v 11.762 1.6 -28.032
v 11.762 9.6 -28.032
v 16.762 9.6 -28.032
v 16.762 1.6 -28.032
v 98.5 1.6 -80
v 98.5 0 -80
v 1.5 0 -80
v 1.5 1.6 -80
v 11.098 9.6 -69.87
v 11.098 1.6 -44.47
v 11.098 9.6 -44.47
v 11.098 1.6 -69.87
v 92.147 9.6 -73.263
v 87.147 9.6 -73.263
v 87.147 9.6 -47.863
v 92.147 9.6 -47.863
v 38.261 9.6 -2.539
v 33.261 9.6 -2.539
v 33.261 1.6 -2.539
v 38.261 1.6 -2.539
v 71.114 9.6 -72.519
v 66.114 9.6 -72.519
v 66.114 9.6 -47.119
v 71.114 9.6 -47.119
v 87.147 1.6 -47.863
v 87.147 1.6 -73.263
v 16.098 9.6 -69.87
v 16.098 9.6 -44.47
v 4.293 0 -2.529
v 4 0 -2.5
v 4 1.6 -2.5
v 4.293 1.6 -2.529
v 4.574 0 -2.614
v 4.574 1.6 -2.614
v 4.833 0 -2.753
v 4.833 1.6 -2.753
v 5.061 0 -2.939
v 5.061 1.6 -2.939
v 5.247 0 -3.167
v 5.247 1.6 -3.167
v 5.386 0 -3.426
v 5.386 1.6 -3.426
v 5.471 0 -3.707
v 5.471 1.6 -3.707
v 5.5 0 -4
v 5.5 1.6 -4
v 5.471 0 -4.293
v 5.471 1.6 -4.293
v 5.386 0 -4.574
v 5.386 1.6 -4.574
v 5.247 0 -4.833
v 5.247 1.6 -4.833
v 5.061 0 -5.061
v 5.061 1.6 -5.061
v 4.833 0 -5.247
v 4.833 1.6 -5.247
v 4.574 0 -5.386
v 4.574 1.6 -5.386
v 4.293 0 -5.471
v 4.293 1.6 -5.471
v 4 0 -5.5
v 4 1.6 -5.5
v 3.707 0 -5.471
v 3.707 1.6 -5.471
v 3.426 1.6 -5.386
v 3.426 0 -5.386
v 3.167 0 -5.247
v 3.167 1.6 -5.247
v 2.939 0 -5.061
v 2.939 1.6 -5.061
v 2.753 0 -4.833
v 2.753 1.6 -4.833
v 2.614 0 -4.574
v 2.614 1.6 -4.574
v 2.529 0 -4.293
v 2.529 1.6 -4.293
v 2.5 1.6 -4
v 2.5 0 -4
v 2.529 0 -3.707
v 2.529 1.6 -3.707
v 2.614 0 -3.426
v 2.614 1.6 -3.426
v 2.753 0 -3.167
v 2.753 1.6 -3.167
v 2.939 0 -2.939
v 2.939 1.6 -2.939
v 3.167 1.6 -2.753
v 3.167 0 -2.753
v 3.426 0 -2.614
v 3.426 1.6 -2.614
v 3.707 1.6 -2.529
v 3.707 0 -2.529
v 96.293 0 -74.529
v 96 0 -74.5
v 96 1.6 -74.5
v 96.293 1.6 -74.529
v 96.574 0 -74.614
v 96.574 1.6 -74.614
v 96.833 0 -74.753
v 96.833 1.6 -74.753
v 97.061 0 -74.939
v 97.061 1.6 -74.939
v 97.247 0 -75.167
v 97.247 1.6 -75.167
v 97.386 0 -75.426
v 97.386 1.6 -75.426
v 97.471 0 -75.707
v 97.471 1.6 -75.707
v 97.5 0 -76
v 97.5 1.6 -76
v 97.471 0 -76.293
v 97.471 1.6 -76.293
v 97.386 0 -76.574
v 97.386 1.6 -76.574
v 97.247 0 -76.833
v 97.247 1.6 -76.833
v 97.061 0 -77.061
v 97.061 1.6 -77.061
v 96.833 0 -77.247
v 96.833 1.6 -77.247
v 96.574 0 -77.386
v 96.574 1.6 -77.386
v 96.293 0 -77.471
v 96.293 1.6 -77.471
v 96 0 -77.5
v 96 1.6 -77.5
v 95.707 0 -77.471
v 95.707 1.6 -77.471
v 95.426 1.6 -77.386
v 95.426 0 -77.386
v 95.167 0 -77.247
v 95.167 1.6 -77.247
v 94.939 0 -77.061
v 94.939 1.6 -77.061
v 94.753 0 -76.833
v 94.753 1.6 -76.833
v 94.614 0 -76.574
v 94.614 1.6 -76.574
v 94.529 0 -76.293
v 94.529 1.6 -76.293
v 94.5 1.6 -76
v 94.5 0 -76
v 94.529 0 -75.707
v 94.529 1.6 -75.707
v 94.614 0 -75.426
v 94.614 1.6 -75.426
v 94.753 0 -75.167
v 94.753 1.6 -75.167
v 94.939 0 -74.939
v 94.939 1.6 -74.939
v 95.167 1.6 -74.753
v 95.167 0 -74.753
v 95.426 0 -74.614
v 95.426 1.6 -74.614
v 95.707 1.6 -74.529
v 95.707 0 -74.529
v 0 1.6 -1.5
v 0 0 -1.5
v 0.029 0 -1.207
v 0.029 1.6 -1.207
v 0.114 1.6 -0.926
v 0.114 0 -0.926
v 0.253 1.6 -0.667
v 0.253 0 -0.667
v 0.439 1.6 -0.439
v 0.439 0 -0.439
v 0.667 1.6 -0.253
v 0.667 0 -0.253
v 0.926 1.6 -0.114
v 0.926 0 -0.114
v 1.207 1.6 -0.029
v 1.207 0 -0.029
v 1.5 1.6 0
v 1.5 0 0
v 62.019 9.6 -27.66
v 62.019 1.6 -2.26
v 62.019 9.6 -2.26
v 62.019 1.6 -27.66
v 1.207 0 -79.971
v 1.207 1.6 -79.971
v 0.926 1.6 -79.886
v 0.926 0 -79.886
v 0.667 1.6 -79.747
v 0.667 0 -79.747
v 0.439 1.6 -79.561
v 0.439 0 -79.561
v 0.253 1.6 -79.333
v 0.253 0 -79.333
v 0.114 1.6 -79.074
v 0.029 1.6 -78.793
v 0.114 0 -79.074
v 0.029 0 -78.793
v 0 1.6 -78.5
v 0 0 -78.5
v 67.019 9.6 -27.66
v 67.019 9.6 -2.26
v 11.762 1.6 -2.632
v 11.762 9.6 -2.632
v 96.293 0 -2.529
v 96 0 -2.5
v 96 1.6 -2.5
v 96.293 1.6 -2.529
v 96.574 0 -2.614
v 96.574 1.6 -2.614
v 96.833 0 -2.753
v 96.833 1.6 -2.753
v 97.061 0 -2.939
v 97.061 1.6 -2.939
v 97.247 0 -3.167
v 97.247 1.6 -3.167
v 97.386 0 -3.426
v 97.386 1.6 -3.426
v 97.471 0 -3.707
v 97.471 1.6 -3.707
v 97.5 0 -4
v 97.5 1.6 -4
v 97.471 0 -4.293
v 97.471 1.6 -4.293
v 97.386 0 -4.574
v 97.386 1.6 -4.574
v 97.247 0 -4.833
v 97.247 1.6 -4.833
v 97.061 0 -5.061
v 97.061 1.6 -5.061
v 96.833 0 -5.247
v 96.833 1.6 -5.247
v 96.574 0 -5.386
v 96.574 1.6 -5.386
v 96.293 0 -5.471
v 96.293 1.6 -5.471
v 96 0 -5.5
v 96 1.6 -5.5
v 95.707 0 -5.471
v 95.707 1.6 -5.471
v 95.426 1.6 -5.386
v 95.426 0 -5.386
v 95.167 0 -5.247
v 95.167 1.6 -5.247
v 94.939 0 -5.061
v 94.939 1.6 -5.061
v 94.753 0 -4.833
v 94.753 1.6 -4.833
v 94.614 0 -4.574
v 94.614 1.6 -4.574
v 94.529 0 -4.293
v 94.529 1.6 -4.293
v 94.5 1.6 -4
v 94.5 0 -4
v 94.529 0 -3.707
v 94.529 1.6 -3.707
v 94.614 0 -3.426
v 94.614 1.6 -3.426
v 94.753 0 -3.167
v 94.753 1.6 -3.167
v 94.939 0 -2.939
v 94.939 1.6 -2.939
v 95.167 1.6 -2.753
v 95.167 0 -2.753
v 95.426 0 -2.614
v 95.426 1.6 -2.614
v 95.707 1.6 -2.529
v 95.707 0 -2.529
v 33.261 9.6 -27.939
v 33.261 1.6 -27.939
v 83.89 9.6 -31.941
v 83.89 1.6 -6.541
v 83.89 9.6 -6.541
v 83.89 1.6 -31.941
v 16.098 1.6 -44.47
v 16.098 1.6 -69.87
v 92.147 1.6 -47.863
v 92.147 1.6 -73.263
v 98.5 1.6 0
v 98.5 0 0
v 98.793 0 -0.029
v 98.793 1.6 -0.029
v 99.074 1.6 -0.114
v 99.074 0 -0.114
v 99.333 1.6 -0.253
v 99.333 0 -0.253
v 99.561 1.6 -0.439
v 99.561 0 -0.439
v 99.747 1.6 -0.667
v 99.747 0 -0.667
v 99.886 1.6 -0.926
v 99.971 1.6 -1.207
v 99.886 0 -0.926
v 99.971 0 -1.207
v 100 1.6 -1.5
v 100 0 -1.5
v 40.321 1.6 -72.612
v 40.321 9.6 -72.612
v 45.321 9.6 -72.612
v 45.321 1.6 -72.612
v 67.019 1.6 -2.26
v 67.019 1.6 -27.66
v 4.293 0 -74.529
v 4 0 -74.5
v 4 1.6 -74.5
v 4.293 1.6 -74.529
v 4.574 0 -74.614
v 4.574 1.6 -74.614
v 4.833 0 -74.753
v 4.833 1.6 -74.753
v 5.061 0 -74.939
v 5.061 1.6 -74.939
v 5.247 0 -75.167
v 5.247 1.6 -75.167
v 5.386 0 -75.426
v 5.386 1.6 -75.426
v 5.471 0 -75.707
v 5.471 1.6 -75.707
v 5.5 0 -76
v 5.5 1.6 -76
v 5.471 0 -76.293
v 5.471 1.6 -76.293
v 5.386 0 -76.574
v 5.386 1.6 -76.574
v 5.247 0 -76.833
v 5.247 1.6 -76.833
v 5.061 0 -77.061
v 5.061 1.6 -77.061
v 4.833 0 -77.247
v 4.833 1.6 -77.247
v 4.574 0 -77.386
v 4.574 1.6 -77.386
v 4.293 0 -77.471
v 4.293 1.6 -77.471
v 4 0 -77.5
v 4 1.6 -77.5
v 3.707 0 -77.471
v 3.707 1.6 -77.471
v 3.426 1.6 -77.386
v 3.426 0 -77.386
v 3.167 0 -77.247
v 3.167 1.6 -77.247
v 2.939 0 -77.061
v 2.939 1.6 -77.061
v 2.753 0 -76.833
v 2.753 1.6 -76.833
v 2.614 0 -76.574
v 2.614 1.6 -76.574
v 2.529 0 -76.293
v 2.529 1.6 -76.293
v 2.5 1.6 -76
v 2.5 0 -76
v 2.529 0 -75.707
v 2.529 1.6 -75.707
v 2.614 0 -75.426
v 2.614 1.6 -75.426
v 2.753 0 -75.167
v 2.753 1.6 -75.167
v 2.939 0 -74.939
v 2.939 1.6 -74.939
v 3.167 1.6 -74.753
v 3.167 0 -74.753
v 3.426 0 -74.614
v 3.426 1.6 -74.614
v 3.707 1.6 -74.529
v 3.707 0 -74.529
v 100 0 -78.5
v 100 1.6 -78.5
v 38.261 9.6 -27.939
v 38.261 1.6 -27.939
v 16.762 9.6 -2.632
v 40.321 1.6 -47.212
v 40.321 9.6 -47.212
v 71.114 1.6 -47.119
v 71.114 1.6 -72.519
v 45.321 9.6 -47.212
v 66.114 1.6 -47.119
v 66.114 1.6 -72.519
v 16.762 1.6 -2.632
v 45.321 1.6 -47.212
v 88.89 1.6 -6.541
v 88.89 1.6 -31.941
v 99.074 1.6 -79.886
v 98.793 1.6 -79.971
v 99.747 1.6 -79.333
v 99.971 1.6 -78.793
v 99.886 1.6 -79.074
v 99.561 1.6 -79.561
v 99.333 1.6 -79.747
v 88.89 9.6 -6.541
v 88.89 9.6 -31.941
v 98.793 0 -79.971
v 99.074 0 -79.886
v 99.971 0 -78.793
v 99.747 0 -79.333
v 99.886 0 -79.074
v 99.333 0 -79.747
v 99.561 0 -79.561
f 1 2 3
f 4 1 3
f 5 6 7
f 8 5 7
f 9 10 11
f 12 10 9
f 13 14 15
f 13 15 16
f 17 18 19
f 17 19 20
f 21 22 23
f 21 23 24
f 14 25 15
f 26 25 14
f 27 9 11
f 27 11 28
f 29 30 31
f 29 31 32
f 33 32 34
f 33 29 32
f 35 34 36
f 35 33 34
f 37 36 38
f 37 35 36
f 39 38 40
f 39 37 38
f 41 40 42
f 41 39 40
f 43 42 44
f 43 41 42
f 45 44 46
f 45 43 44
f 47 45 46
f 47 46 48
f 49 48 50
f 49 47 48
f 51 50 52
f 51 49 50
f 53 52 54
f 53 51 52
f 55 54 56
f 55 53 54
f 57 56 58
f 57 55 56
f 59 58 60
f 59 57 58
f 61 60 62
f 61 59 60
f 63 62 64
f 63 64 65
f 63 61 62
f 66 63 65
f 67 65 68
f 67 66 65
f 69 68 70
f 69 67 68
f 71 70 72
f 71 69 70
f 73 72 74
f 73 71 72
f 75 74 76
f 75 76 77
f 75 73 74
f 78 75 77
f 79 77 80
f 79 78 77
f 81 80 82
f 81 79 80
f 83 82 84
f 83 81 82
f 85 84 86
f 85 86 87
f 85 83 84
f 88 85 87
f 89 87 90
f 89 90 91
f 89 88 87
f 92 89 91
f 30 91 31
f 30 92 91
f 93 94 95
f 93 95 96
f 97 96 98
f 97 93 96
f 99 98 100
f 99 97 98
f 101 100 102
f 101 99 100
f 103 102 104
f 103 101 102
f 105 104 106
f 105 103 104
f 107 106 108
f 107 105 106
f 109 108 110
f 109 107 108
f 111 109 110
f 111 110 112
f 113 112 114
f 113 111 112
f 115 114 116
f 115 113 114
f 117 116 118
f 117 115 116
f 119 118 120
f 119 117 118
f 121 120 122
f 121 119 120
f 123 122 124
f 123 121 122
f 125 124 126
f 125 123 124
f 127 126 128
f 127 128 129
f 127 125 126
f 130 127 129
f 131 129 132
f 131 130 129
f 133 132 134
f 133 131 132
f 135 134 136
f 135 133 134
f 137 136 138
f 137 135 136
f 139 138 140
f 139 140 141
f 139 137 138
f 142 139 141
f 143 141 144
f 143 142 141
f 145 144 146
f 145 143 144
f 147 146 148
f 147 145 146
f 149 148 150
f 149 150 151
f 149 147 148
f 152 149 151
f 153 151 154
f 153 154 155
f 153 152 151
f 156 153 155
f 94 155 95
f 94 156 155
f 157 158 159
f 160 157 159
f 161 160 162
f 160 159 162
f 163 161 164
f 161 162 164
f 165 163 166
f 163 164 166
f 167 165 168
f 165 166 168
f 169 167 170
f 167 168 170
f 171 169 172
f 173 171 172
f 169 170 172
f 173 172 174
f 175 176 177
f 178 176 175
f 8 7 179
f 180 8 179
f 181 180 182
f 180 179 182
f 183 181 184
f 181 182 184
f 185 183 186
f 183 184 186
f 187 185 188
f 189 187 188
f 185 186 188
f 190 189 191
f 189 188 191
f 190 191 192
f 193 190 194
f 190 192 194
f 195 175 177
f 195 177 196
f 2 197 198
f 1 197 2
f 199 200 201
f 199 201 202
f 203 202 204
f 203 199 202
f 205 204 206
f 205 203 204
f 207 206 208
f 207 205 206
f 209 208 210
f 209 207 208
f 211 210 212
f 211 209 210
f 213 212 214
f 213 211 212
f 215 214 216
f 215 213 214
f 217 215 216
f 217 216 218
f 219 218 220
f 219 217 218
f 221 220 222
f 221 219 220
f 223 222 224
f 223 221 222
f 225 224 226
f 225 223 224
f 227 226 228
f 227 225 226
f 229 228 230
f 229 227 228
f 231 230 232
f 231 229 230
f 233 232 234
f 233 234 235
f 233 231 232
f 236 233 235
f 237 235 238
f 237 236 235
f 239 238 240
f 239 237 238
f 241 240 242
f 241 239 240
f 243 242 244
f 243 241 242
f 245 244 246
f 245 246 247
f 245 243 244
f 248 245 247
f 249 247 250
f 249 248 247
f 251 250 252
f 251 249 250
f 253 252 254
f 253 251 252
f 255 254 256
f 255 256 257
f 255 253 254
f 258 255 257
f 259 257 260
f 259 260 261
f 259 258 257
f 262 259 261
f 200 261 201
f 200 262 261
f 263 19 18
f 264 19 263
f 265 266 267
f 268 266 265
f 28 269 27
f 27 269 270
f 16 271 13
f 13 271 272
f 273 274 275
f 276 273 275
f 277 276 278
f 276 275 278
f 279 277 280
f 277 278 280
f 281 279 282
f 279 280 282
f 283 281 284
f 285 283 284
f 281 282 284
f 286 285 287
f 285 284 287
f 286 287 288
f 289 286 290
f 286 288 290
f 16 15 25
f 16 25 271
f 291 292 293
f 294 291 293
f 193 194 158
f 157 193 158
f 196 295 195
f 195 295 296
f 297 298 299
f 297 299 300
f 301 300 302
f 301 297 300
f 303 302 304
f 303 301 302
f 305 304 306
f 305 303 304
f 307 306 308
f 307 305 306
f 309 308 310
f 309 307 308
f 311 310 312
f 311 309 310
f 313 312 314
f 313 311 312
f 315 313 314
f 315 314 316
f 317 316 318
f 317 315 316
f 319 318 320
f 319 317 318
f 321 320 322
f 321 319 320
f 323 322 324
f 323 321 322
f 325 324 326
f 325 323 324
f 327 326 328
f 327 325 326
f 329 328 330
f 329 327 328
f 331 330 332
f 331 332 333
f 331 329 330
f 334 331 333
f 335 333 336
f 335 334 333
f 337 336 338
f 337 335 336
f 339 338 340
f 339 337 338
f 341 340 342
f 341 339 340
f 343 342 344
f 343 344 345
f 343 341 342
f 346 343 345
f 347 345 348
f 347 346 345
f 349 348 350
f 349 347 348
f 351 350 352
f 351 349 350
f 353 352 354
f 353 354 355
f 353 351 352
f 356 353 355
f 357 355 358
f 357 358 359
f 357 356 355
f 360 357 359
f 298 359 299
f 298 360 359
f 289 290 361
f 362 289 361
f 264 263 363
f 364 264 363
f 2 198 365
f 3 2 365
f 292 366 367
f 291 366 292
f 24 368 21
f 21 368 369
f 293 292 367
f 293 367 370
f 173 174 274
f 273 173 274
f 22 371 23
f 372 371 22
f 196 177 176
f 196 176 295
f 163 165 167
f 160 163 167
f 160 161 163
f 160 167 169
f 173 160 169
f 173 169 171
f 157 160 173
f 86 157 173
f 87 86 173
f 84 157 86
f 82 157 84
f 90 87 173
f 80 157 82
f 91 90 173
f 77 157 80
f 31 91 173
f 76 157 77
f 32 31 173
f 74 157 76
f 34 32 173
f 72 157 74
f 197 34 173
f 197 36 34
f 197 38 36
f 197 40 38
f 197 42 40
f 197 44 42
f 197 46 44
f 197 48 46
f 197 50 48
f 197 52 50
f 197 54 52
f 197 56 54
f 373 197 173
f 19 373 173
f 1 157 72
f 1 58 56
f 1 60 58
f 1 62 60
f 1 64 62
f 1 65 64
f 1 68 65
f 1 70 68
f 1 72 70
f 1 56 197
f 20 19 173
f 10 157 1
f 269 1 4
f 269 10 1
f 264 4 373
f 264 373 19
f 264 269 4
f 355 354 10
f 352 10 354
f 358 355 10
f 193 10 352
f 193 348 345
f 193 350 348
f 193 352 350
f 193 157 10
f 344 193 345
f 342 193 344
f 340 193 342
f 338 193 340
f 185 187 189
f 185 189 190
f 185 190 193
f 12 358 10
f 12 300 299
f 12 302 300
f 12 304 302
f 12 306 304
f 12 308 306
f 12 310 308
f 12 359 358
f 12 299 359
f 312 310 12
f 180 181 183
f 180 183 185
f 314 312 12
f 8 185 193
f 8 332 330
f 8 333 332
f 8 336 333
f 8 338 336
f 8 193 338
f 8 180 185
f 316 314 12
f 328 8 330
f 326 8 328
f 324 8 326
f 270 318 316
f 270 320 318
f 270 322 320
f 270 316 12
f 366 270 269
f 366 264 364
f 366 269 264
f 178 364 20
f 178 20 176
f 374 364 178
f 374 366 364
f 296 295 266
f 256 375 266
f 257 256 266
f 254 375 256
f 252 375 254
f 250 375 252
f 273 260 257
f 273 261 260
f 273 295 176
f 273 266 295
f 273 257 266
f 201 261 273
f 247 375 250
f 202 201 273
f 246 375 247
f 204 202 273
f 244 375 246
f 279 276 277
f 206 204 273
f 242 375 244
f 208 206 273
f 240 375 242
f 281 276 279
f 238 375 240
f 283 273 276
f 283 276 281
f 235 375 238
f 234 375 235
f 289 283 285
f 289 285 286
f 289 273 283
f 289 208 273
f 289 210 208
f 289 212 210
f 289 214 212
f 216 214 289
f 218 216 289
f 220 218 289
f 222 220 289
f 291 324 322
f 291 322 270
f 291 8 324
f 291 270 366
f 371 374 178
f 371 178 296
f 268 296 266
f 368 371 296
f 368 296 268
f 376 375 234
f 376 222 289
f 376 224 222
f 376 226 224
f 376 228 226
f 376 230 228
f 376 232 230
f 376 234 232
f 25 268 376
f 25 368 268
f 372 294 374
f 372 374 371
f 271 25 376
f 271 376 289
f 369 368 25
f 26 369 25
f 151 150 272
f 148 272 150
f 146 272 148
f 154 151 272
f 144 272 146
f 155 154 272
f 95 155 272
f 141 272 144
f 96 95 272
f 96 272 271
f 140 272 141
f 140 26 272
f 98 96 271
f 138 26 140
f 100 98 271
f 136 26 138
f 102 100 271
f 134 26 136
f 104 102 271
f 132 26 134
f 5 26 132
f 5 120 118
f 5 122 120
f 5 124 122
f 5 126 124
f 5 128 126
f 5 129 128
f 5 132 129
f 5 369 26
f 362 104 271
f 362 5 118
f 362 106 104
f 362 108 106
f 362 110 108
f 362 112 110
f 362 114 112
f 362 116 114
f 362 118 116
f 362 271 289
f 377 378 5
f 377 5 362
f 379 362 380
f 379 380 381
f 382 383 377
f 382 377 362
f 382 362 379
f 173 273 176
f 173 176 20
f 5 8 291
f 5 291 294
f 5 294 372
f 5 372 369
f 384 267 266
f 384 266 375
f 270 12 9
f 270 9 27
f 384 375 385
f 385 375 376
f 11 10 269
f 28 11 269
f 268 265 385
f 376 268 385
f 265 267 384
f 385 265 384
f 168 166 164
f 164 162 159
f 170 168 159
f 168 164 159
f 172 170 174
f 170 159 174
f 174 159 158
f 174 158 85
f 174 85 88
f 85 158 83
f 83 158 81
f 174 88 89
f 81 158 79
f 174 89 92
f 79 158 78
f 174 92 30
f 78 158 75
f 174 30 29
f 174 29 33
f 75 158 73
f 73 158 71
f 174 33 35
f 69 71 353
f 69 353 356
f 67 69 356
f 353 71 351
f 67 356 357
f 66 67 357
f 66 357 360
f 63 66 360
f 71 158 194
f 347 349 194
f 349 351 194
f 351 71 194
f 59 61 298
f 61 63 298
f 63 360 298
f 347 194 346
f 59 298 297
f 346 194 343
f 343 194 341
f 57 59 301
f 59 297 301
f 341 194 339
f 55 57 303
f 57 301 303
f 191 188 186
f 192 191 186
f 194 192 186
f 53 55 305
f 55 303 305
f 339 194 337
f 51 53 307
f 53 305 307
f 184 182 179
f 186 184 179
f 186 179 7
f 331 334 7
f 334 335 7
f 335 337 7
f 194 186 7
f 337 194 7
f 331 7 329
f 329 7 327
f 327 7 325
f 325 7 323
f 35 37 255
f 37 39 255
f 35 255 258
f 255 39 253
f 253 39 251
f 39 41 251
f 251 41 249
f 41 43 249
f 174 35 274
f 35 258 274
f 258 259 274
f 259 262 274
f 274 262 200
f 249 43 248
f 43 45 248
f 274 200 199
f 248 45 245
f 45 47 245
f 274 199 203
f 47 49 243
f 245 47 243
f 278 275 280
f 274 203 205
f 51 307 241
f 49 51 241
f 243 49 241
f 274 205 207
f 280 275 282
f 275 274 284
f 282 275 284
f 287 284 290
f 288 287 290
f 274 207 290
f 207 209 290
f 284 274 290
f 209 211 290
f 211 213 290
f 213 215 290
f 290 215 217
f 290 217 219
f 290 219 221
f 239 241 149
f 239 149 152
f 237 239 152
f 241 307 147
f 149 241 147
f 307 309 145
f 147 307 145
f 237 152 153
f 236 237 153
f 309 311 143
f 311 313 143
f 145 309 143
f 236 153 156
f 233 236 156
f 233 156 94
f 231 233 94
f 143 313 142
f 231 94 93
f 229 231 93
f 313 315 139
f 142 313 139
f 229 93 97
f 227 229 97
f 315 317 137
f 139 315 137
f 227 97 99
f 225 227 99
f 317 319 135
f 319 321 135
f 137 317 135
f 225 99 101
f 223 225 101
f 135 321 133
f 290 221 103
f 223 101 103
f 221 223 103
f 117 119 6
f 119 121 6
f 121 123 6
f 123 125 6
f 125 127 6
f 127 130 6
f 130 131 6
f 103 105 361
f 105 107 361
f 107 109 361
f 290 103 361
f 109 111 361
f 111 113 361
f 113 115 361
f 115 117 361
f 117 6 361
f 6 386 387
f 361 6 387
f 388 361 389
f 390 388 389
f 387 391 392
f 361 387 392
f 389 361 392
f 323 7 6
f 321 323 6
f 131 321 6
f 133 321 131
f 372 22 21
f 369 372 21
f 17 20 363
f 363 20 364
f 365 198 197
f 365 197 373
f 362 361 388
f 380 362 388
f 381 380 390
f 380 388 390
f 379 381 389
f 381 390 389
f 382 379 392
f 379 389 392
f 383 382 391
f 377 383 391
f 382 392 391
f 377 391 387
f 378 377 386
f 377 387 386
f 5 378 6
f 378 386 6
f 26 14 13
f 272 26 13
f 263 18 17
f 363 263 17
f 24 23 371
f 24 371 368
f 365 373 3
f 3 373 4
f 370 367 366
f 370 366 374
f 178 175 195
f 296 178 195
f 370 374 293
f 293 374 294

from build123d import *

# Parameters (mm, degrees)
SKETCH1_R           = 1.5
BOSS_EXTRUDE1_DEPTH = 1.6
SKETCH2_W           = 5
SKETCH2_H           = 25.4
BOSS_EXTRUDE2_DEPTH = 8


with BuildPart() as part:
    # Sketch1 → Boss-Extrude1 (new body)
    with BuildSketch(Plane(origin=(0, 0, 0), x_dir=(1, 0, 0), z_dir=(0, 1, 0))):
        with BuildLine():
            Line((1.5, 0), (98.5, 0))
            ThreePointArc((98.5, 0), (99.560660172, 0.439339828), (100, 1.5))
            Line((100, 1.5), (100, 78.5))
            ThreePointArc((100, 78.5), (99.560660172, 79.560660172), (98.5, 80))
            Line((98.5, 80), (1.5, 80))
            ThreePointArc((1.5, 80), (0.439339828, 79.560660172), (0, 78.5))
            Line((0, 78.5), (0, 1.5))
            ThreePointArc((0, 1.5), (0.439339828, 0.439339828), (1.5, 0))
        make_face()
        with Locations(Location((4, 4, 0), (0, 0, 270))):
            Circle(SKETCH1_R, mode=Mode.SUBTRACT)
        with Locations(Location((96, 76, 0), (0, 0, 270))):
            Circle(SKETCH1_R, mode=Mode.SUBTRACT)
        with Locations(Location((96, 4, 0), (0, 0, 270))):
            Circle(SKETCH1_R, mode=Mode.SUBTRACT)
        with Locations(Location((4, 76, 0), (0, 0, 270))):
            Circle(SKETCH1_R, mode=Mode.SUBTRACT)
    extrude(amount=BOSS_EXTRUDE1_DEPTH)

    # Sketch2 → Boss-Extrude2 (add)
    with BuildSketch(Plane(origin=(0, 1.6, 0), x_dir=(1, 0, 0), z_dir=(0, 1, 0))):
        with Locations((14.261833114, 15.332116758)):
            Rectangle(SKETCH2_W, SKETCH2_H)
        with Locations((13.597516255, 57.170048516)):
            Rectangle(SKETCH2_W, SKETCH2_H)
        with Locations((89.647028889, 60.563234223)):
            Rectangle(SKETCH2_W, SKETCH2_H)
        with Locations((86.389643886, 19.240978761)):
            Rectangle(SKETCH2_W, SKETCH2_H)
        with Locations((42.820913135, 59.911757222)):
            Rectangle(SKETCH2_W, SKETCH2_H)
        with Locations((68.613628586, 59.818689079)):
            Rectangle(SKETCH2_W, SKETCH2_H)
        with Locations((35.760574132, 15.239048615)):
            Rectangle(SKETCH2_W, SKETCH2_H)
        with Locations((64.518630297, 14.959844186)):
            Rectangle(SKETCH2_W, SKETCH2_H)
    extrude(amount=BOSS_EXTRUDE2_DEPTH)


solid = part.part
